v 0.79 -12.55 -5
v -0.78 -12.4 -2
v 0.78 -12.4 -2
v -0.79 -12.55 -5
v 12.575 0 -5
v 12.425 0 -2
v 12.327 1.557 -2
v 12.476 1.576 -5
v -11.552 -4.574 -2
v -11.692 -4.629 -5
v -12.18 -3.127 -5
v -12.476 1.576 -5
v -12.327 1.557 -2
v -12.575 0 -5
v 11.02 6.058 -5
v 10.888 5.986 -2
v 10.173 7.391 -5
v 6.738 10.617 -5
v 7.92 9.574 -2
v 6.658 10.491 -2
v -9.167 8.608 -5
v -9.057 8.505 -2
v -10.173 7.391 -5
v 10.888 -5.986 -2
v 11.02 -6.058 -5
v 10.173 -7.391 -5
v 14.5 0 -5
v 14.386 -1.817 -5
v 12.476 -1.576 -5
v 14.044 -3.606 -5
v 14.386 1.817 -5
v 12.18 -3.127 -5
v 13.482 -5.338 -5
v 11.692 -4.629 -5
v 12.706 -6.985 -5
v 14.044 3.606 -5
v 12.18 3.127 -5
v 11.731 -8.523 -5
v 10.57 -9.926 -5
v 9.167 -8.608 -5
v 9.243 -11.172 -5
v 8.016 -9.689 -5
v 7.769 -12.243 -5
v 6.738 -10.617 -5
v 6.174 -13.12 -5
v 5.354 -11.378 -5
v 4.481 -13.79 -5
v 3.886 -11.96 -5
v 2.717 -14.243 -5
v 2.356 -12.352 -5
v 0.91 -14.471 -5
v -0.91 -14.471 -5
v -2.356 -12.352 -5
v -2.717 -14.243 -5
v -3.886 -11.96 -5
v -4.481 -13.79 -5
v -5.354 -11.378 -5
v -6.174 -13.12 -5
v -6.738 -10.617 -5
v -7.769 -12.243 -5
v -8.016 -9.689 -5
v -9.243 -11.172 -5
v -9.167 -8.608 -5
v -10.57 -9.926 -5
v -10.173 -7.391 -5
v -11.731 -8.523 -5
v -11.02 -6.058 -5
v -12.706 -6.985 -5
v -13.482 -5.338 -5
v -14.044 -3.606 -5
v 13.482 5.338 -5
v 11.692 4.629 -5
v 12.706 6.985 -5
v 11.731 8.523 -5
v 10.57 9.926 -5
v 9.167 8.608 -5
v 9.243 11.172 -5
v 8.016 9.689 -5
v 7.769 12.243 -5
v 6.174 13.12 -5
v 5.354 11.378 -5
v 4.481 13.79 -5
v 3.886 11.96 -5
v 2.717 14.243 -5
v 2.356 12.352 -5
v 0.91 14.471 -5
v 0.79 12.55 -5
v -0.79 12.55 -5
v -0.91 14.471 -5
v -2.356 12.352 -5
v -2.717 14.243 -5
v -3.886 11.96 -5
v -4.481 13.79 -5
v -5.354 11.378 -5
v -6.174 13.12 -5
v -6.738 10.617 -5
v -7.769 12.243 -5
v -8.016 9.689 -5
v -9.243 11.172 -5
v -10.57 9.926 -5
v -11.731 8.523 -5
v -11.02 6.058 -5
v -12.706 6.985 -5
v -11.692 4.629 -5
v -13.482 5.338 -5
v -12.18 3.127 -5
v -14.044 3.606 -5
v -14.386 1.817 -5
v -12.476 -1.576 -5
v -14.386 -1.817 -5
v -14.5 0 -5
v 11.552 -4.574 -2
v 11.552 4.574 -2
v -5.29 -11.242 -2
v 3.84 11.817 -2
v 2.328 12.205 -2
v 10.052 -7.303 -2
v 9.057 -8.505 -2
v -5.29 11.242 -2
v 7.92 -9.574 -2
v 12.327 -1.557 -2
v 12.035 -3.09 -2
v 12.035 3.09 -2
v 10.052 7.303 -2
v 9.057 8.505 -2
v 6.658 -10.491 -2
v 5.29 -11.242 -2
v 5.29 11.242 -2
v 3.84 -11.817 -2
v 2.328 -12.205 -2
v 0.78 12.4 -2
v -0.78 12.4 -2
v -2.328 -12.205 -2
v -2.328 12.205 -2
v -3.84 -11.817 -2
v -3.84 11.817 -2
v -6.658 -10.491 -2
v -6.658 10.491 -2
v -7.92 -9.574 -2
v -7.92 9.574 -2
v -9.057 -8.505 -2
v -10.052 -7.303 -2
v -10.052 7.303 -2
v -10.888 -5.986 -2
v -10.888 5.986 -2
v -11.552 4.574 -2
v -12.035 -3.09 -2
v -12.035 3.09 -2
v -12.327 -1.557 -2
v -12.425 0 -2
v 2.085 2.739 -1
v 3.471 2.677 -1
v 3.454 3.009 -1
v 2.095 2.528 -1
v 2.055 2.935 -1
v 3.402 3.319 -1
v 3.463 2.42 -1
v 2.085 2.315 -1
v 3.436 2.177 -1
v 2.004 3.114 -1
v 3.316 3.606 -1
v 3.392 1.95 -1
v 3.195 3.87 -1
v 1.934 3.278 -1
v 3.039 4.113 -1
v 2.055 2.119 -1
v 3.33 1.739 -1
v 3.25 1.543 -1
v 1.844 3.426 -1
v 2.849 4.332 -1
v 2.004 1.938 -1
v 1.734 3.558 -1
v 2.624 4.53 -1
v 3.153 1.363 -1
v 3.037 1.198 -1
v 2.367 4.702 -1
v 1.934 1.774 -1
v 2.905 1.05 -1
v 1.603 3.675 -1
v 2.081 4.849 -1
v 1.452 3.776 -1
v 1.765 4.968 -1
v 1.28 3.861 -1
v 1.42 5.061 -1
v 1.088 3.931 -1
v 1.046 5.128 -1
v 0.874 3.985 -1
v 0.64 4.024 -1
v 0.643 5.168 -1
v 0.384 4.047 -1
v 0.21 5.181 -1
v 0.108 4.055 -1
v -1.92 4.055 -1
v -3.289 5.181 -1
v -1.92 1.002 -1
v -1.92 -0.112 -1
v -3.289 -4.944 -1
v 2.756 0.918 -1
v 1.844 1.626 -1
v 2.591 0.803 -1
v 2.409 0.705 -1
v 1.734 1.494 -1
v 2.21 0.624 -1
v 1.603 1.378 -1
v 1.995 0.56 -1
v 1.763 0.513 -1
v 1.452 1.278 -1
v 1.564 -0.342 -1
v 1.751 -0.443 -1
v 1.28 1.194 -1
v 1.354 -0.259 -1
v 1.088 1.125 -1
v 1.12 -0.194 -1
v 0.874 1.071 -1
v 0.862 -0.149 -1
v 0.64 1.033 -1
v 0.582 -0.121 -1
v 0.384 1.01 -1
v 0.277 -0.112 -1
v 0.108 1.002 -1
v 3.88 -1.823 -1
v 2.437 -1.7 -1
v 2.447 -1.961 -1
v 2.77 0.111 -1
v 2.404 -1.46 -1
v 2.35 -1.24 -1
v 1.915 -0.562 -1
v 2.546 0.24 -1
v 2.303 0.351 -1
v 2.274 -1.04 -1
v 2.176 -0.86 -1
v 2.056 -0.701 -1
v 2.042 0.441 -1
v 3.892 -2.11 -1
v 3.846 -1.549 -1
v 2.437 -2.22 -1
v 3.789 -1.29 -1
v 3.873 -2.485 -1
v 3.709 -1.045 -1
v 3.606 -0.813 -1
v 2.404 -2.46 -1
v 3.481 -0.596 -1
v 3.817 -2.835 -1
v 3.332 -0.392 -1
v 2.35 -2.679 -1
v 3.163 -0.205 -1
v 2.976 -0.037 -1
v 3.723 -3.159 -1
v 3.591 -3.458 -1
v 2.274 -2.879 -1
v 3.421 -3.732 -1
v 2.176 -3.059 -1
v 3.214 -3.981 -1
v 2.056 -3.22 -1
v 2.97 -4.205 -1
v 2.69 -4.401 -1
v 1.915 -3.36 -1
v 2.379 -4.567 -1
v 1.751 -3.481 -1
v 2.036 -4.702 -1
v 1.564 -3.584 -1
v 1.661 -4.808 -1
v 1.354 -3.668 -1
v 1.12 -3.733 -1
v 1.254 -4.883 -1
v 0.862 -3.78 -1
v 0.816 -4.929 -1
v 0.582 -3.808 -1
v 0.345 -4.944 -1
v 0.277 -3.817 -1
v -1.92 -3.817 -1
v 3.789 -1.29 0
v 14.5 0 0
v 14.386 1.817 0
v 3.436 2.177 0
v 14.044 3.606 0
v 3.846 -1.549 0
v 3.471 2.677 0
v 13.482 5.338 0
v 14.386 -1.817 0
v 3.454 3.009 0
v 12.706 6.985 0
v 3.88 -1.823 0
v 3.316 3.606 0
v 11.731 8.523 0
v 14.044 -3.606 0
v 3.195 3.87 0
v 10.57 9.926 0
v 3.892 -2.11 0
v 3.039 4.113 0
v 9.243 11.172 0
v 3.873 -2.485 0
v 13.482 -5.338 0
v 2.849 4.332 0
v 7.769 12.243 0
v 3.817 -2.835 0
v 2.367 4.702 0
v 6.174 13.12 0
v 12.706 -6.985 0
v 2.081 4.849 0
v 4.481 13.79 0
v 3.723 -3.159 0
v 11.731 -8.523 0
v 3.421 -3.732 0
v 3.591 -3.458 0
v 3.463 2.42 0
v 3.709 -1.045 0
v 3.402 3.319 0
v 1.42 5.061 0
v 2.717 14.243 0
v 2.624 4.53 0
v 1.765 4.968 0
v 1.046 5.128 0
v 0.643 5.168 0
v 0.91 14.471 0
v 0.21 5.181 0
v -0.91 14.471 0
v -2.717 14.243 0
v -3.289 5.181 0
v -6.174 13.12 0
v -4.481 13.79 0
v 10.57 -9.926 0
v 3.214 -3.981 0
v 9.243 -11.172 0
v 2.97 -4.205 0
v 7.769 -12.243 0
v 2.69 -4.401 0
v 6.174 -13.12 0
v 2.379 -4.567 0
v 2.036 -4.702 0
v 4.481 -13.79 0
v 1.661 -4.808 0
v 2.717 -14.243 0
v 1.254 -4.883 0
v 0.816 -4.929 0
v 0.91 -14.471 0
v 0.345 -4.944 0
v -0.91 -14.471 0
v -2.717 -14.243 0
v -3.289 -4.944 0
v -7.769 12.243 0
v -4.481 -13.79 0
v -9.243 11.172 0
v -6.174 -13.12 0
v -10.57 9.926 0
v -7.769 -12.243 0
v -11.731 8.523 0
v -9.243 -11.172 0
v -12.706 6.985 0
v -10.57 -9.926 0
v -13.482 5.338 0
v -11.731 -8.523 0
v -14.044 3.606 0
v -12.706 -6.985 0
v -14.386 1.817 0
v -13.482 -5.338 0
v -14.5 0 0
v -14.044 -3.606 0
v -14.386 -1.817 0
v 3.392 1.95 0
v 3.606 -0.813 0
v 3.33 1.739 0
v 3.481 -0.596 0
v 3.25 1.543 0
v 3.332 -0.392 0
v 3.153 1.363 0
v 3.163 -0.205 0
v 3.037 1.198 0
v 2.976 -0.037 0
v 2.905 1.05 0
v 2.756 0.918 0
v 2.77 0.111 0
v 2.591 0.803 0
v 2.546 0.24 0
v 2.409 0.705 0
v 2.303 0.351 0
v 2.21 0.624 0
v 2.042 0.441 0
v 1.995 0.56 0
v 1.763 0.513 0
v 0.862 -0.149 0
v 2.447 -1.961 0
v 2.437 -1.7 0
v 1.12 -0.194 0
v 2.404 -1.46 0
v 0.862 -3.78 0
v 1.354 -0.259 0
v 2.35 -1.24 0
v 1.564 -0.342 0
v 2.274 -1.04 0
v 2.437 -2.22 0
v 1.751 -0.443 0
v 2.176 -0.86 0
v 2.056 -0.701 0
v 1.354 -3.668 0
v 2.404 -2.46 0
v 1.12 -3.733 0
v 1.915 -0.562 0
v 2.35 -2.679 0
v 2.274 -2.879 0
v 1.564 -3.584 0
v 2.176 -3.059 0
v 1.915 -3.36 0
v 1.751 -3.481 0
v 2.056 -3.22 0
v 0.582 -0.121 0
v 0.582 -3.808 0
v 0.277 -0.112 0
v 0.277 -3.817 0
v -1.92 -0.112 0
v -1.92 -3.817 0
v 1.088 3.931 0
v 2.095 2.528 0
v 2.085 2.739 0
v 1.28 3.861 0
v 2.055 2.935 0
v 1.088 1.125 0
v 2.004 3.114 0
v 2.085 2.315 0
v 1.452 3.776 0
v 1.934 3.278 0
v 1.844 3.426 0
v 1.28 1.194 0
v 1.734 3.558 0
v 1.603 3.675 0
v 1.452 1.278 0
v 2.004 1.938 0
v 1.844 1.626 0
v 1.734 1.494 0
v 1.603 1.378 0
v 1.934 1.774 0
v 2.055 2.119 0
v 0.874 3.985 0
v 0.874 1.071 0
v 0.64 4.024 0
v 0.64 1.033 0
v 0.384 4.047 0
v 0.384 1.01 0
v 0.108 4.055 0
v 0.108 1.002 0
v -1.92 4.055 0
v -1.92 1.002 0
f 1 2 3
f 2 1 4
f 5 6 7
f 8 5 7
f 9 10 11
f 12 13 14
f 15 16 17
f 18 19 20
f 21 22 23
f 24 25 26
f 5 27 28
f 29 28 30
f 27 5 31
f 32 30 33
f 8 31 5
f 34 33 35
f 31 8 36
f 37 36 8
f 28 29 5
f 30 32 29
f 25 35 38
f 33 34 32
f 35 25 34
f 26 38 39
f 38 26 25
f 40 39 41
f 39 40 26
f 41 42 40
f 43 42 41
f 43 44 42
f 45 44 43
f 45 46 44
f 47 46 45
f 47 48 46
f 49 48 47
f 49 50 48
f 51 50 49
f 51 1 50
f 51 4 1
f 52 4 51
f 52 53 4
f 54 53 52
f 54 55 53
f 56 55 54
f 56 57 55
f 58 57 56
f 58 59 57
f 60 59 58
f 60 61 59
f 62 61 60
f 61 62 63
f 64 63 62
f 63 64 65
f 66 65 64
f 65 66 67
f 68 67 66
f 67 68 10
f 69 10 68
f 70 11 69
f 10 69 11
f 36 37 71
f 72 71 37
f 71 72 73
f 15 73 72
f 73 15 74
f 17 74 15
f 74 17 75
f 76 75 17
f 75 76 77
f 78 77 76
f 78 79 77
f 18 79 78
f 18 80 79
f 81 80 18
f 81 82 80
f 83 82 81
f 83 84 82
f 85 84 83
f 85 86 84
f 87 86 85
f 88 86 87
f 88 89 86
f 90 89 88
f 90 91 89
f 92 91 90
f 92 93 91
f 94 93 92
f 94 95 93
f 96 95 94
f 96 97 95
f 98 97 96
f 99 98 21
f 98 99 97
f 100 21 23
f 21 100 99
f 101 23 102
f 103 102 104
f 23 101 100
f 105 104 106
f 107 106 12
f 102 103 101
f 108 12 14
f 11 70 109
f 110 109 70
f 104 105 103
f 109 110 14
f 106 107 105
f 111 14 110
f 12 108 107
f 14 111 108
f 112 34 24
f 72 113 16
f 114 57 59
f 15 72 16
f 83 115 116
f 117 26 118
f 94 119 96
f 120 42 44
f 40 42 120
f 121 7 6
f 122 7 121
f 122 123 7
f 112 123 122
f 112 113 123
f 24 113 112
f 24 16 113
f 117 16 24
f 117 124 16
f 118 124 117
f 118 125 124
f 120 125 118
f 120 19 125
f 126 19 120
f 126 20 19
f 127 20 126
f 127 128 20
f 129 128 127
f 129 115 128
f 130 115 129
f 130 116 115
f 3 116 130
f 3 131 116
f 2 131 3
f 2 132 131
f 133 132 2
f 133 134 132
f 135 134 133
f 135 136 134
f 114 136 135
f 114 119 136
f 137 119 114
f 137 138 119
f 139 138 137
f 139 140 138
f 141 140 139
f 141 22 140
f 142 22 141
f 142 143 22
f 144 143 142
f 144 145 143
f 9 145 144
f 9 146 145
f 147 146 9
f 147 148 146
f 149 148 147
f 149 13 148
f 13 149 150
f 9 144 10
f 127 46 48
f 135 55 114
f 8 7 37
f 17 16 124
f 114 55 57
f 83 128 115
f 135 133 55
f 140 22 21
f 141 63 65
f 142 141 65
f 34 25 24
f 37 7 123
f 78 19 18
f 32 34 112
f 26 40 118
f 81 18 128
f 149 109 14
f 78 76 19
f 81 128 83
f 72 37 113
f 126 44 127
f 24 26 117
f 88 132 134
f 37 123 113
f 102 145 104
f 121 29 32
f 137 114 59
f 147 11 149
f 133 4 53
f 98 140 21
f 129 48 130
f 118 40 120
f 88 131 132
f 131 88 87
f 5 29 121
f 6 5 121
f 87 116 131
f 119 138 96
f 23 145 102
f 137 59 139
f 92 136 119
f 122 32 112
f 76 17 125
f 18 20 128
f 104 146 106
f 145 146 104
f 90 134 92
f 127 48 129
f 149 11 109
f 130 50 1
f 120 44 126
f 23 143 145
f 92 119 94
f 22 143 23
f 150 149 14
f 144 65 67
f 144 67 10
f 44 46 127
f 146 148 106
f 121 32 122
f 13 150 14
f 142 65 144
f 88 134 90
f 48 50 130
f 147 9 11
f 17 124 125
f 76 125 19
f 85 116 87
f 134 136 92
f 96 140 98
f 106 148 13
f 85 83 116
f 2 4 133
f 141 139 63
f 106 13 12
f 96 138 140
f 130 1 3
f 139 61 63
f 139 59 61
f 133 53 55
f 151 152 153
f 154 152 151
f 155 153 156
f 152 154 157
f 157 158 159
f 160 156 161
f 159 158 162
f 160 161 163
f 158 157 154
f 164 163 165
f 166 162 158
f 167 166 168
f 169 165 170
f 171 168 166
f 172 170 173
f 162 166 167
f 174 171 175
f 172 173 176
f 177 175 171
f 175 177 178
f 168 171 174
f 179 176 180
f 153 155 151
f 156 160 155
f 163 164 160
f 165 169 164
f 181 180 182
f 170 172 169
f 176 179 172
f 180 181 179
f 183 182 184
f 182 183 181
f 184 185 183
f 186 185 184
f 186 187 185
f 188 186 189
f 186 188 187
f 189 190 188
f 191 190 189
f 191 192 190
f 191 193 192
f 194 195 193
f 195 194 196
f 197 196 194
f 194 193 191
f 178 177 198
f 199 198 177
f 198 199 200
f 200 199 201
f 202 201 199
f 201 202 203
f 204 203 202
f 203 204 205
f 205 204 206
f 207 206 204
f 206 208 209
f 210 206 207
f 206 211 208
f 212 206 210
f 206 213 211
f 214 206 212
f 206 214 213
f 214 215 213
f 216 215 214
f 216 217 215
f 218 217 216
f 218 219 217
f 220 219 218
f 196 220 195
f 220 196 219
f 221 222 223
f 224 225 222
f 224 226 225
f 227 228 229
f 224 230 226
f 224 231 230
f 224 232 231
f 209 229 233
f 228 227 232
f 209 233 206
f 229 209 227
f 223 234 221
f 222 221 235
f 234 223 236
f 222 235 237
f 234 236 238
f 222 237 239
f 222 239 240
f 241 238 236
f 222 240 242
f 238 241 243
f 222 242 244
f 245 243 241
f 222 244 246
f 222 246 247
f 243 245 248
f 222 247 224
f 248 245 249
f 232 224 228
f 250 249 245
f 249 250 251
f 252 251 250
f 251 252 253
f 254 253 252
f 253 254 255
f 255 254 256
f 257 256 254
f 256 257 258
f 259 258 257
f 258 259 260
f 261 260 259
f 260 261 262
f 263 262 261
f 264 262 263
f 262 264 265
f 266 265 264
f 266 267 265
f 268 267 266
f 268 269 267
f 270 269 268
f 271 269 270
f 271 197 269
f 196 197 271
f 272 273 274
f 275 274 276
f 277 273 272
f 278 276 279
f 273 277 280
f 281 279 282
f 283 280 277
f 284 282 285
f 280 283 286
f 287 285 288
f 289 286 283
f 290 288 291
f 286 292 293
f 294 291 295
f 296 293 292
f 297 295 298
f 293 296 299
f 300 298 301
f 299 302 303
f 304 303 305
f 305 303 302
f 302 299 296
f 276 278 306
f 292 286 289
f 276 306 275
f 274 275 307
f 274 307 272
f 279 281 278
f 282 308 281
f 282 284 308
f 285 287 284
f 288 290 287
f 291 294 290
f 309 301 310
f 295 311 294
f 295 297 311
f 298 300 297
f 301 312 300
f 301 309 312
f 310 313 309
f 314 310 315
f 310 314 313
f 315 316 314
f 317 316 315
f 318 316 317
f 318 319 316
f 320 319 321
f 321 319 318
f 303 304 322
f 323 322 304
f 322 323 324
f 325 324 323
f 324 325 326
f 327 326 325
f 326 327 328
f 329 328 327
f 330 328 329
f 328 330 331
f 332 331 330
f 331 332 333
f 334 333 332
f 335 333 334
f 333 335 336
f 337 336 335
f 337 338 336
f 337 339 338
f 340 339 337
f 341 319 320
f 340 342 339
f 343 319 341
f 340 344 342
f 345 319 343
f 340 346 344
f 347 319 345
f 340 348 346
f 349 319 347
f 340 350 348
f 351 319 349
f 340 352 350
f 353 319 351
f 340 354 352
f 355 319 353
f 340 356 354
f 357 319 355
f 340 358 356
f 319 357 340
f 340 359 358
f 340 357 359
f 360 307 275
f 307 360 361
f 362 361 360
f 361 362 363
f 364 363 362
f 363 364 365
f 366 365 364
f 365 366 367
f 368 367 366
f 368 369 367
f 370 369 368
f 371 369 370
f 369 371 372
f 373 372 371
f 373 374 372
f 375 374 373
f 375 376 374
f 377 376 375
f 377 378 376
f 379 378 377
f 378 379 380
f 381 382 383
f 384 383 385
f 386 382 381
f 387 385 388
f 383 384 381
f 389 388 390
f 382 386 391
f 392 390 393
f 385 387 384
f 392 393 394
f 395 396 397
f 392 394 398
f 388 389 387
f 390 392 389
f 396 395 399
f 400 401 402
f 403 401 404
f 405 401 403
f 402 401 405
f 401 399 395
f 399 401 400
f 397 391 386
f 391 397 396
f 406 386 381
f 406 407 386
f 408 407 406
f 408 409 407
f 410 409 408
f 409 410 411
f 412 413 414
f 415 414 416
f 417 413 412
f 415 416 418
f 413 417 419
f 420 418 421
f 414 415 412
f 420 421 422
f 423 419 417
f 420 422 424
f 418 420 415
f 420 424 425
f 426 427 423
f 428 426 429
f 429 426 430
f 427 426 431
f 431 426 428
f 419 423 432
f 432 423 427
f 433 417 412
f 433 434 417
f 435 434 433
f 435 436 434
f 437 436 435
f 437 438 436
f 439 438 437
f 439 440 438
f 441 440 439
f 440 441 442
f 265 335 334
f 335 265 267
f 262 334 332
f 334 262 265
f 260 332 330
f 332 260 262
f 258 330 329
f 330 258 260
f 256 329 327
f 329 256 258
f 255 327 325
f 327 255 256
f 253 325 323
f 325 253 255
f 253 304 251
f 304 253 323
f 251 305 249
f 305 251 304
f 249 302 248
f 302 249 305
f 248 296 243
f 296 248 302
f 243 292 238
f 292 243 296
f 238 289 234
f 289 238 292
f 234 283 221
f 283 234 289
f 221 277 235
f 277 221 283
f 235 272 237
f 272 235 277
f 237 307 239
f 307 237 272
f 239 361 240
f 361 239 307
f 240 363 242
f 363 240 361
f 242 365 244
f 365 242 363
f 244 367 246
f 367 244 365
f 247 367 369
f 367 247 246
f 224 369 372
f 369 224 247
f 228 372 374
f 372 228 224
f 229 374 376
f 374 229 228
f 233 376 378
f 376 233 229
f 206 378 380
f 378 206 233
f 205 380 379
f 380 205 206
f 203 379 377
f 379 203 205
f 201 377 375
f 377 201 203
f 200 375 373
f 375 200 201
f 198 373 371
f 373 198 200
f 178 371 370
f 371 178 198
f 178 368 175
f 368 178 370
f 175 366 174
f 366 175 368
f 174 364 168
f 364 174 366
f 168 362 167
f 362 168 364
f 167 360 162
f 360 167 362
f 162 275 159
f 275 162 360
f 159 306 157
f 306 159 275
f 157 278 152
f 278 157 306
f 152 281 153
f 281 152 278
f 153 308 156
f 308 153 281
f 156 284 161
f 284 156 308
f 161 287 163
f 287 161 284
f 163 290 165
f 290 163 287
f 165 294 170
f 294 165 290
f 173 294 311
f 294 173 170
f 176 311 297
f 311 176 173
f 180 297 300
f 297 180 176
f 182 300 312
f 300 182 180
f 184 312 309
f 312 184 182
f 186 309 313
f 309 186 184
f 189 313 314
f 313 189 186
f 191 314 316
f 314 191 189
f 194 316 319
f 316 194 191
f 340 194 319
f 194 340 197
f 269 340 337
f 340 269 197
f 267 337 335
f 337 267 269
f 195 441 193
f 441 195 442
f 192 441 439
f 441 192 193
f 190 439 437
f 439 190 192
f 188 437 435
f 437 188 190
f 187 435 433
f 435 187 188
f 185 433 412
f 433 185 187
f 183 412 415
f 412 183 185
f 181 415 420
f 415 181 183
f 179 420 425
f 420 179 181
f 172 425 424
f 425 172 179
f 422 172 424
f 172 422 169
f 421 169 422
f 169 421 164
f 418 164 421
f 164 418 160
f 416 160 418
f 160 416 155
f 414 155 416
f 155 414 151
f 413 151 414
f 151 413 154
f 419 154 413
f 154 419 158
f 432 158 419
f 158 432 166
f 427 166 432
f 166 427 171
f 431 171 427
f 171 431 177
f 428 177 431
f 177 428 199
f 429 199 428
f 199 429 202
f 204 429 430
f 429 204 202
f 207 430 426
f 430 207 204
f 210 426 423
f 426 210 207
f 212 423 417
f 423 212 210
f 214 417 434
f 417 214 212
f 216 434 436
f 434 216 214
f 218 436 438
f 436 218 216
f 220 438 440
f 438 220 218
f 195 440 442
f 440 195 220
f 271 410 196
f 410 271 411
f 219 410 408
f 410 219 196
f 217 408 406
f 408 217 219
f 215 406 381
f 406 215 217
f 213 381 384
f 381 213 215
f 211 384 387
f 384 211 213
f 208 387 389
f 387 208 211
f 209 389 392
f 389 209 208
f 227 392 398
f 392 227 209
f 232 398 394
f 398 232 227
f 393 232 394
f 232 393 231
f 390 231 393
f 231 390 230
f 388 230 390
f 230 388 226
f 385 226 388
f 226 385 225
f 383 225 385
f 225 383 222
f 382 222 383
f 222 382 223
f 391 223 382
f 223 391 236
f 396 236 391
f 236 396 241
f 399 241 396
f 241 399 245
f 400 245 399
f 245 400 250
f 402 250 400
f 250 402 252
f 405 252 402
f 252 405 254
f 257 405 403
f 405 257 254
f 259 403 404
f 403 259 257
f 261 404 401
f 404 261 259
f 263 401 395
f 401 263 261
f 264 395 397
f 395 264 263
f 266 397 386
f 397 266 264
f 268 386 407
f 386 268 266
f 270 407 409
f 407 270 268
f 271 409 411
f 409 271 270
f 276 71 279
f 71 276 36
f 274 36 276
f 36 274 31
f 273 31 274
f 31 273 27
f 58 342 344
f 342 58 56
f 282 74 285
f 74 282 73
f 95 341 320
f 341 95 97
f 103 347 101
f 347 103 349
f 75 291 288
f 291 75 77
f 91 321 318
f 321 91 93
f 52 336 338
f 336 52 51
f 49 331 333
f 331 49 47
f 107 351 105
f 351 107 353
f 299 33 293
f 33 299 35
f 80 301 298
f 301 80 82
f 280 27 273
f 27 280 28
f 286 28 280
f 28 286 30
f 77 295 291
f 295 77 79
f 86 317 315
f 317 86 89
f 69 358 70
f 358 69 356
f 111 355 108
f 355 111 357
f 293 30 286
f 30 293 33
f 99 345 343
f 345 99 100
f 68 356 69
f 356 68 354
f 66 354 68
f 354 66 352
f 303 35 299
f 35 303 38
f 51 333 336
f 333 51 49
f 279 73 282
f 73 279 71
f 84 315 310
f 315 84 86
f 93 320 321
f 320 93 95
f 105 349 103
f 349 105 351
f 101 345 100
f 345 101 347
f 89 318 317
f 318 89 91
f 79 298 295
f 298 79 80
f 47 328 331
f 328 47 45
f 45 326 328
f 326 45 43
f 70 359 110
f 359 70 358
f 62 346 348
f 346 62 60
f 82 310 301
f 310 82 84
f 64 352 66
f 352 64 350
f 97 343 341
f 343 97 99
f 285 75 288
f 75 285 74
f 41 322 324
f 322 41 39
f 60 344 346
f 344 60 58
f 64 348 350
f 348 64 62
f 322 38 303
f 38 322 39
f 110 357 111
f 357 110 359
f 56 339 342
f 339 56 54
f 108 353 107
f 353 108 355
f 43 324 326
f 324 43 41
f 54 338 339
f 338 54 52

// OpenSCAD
$fn = 50;


difference() {
	union() {
		translate(v = [0, 0, -5.0000000000]) {
			cylinder(h = 5, r = 14.5000000000);
		}
	}
	union() {
		#translate(v = [0, 0, -5.0000000000]) {
			cylinder(h = 3, r1 = 12.5750000000, r2 = 12.4250000000);
		}
		translate(v = [0, 0, -1]) {
			linear_extrude(height = 1) {
				text(font = "Impact", halign = "center", size = 10, text = "B", valign = "center");
			}
		}
	}
}
